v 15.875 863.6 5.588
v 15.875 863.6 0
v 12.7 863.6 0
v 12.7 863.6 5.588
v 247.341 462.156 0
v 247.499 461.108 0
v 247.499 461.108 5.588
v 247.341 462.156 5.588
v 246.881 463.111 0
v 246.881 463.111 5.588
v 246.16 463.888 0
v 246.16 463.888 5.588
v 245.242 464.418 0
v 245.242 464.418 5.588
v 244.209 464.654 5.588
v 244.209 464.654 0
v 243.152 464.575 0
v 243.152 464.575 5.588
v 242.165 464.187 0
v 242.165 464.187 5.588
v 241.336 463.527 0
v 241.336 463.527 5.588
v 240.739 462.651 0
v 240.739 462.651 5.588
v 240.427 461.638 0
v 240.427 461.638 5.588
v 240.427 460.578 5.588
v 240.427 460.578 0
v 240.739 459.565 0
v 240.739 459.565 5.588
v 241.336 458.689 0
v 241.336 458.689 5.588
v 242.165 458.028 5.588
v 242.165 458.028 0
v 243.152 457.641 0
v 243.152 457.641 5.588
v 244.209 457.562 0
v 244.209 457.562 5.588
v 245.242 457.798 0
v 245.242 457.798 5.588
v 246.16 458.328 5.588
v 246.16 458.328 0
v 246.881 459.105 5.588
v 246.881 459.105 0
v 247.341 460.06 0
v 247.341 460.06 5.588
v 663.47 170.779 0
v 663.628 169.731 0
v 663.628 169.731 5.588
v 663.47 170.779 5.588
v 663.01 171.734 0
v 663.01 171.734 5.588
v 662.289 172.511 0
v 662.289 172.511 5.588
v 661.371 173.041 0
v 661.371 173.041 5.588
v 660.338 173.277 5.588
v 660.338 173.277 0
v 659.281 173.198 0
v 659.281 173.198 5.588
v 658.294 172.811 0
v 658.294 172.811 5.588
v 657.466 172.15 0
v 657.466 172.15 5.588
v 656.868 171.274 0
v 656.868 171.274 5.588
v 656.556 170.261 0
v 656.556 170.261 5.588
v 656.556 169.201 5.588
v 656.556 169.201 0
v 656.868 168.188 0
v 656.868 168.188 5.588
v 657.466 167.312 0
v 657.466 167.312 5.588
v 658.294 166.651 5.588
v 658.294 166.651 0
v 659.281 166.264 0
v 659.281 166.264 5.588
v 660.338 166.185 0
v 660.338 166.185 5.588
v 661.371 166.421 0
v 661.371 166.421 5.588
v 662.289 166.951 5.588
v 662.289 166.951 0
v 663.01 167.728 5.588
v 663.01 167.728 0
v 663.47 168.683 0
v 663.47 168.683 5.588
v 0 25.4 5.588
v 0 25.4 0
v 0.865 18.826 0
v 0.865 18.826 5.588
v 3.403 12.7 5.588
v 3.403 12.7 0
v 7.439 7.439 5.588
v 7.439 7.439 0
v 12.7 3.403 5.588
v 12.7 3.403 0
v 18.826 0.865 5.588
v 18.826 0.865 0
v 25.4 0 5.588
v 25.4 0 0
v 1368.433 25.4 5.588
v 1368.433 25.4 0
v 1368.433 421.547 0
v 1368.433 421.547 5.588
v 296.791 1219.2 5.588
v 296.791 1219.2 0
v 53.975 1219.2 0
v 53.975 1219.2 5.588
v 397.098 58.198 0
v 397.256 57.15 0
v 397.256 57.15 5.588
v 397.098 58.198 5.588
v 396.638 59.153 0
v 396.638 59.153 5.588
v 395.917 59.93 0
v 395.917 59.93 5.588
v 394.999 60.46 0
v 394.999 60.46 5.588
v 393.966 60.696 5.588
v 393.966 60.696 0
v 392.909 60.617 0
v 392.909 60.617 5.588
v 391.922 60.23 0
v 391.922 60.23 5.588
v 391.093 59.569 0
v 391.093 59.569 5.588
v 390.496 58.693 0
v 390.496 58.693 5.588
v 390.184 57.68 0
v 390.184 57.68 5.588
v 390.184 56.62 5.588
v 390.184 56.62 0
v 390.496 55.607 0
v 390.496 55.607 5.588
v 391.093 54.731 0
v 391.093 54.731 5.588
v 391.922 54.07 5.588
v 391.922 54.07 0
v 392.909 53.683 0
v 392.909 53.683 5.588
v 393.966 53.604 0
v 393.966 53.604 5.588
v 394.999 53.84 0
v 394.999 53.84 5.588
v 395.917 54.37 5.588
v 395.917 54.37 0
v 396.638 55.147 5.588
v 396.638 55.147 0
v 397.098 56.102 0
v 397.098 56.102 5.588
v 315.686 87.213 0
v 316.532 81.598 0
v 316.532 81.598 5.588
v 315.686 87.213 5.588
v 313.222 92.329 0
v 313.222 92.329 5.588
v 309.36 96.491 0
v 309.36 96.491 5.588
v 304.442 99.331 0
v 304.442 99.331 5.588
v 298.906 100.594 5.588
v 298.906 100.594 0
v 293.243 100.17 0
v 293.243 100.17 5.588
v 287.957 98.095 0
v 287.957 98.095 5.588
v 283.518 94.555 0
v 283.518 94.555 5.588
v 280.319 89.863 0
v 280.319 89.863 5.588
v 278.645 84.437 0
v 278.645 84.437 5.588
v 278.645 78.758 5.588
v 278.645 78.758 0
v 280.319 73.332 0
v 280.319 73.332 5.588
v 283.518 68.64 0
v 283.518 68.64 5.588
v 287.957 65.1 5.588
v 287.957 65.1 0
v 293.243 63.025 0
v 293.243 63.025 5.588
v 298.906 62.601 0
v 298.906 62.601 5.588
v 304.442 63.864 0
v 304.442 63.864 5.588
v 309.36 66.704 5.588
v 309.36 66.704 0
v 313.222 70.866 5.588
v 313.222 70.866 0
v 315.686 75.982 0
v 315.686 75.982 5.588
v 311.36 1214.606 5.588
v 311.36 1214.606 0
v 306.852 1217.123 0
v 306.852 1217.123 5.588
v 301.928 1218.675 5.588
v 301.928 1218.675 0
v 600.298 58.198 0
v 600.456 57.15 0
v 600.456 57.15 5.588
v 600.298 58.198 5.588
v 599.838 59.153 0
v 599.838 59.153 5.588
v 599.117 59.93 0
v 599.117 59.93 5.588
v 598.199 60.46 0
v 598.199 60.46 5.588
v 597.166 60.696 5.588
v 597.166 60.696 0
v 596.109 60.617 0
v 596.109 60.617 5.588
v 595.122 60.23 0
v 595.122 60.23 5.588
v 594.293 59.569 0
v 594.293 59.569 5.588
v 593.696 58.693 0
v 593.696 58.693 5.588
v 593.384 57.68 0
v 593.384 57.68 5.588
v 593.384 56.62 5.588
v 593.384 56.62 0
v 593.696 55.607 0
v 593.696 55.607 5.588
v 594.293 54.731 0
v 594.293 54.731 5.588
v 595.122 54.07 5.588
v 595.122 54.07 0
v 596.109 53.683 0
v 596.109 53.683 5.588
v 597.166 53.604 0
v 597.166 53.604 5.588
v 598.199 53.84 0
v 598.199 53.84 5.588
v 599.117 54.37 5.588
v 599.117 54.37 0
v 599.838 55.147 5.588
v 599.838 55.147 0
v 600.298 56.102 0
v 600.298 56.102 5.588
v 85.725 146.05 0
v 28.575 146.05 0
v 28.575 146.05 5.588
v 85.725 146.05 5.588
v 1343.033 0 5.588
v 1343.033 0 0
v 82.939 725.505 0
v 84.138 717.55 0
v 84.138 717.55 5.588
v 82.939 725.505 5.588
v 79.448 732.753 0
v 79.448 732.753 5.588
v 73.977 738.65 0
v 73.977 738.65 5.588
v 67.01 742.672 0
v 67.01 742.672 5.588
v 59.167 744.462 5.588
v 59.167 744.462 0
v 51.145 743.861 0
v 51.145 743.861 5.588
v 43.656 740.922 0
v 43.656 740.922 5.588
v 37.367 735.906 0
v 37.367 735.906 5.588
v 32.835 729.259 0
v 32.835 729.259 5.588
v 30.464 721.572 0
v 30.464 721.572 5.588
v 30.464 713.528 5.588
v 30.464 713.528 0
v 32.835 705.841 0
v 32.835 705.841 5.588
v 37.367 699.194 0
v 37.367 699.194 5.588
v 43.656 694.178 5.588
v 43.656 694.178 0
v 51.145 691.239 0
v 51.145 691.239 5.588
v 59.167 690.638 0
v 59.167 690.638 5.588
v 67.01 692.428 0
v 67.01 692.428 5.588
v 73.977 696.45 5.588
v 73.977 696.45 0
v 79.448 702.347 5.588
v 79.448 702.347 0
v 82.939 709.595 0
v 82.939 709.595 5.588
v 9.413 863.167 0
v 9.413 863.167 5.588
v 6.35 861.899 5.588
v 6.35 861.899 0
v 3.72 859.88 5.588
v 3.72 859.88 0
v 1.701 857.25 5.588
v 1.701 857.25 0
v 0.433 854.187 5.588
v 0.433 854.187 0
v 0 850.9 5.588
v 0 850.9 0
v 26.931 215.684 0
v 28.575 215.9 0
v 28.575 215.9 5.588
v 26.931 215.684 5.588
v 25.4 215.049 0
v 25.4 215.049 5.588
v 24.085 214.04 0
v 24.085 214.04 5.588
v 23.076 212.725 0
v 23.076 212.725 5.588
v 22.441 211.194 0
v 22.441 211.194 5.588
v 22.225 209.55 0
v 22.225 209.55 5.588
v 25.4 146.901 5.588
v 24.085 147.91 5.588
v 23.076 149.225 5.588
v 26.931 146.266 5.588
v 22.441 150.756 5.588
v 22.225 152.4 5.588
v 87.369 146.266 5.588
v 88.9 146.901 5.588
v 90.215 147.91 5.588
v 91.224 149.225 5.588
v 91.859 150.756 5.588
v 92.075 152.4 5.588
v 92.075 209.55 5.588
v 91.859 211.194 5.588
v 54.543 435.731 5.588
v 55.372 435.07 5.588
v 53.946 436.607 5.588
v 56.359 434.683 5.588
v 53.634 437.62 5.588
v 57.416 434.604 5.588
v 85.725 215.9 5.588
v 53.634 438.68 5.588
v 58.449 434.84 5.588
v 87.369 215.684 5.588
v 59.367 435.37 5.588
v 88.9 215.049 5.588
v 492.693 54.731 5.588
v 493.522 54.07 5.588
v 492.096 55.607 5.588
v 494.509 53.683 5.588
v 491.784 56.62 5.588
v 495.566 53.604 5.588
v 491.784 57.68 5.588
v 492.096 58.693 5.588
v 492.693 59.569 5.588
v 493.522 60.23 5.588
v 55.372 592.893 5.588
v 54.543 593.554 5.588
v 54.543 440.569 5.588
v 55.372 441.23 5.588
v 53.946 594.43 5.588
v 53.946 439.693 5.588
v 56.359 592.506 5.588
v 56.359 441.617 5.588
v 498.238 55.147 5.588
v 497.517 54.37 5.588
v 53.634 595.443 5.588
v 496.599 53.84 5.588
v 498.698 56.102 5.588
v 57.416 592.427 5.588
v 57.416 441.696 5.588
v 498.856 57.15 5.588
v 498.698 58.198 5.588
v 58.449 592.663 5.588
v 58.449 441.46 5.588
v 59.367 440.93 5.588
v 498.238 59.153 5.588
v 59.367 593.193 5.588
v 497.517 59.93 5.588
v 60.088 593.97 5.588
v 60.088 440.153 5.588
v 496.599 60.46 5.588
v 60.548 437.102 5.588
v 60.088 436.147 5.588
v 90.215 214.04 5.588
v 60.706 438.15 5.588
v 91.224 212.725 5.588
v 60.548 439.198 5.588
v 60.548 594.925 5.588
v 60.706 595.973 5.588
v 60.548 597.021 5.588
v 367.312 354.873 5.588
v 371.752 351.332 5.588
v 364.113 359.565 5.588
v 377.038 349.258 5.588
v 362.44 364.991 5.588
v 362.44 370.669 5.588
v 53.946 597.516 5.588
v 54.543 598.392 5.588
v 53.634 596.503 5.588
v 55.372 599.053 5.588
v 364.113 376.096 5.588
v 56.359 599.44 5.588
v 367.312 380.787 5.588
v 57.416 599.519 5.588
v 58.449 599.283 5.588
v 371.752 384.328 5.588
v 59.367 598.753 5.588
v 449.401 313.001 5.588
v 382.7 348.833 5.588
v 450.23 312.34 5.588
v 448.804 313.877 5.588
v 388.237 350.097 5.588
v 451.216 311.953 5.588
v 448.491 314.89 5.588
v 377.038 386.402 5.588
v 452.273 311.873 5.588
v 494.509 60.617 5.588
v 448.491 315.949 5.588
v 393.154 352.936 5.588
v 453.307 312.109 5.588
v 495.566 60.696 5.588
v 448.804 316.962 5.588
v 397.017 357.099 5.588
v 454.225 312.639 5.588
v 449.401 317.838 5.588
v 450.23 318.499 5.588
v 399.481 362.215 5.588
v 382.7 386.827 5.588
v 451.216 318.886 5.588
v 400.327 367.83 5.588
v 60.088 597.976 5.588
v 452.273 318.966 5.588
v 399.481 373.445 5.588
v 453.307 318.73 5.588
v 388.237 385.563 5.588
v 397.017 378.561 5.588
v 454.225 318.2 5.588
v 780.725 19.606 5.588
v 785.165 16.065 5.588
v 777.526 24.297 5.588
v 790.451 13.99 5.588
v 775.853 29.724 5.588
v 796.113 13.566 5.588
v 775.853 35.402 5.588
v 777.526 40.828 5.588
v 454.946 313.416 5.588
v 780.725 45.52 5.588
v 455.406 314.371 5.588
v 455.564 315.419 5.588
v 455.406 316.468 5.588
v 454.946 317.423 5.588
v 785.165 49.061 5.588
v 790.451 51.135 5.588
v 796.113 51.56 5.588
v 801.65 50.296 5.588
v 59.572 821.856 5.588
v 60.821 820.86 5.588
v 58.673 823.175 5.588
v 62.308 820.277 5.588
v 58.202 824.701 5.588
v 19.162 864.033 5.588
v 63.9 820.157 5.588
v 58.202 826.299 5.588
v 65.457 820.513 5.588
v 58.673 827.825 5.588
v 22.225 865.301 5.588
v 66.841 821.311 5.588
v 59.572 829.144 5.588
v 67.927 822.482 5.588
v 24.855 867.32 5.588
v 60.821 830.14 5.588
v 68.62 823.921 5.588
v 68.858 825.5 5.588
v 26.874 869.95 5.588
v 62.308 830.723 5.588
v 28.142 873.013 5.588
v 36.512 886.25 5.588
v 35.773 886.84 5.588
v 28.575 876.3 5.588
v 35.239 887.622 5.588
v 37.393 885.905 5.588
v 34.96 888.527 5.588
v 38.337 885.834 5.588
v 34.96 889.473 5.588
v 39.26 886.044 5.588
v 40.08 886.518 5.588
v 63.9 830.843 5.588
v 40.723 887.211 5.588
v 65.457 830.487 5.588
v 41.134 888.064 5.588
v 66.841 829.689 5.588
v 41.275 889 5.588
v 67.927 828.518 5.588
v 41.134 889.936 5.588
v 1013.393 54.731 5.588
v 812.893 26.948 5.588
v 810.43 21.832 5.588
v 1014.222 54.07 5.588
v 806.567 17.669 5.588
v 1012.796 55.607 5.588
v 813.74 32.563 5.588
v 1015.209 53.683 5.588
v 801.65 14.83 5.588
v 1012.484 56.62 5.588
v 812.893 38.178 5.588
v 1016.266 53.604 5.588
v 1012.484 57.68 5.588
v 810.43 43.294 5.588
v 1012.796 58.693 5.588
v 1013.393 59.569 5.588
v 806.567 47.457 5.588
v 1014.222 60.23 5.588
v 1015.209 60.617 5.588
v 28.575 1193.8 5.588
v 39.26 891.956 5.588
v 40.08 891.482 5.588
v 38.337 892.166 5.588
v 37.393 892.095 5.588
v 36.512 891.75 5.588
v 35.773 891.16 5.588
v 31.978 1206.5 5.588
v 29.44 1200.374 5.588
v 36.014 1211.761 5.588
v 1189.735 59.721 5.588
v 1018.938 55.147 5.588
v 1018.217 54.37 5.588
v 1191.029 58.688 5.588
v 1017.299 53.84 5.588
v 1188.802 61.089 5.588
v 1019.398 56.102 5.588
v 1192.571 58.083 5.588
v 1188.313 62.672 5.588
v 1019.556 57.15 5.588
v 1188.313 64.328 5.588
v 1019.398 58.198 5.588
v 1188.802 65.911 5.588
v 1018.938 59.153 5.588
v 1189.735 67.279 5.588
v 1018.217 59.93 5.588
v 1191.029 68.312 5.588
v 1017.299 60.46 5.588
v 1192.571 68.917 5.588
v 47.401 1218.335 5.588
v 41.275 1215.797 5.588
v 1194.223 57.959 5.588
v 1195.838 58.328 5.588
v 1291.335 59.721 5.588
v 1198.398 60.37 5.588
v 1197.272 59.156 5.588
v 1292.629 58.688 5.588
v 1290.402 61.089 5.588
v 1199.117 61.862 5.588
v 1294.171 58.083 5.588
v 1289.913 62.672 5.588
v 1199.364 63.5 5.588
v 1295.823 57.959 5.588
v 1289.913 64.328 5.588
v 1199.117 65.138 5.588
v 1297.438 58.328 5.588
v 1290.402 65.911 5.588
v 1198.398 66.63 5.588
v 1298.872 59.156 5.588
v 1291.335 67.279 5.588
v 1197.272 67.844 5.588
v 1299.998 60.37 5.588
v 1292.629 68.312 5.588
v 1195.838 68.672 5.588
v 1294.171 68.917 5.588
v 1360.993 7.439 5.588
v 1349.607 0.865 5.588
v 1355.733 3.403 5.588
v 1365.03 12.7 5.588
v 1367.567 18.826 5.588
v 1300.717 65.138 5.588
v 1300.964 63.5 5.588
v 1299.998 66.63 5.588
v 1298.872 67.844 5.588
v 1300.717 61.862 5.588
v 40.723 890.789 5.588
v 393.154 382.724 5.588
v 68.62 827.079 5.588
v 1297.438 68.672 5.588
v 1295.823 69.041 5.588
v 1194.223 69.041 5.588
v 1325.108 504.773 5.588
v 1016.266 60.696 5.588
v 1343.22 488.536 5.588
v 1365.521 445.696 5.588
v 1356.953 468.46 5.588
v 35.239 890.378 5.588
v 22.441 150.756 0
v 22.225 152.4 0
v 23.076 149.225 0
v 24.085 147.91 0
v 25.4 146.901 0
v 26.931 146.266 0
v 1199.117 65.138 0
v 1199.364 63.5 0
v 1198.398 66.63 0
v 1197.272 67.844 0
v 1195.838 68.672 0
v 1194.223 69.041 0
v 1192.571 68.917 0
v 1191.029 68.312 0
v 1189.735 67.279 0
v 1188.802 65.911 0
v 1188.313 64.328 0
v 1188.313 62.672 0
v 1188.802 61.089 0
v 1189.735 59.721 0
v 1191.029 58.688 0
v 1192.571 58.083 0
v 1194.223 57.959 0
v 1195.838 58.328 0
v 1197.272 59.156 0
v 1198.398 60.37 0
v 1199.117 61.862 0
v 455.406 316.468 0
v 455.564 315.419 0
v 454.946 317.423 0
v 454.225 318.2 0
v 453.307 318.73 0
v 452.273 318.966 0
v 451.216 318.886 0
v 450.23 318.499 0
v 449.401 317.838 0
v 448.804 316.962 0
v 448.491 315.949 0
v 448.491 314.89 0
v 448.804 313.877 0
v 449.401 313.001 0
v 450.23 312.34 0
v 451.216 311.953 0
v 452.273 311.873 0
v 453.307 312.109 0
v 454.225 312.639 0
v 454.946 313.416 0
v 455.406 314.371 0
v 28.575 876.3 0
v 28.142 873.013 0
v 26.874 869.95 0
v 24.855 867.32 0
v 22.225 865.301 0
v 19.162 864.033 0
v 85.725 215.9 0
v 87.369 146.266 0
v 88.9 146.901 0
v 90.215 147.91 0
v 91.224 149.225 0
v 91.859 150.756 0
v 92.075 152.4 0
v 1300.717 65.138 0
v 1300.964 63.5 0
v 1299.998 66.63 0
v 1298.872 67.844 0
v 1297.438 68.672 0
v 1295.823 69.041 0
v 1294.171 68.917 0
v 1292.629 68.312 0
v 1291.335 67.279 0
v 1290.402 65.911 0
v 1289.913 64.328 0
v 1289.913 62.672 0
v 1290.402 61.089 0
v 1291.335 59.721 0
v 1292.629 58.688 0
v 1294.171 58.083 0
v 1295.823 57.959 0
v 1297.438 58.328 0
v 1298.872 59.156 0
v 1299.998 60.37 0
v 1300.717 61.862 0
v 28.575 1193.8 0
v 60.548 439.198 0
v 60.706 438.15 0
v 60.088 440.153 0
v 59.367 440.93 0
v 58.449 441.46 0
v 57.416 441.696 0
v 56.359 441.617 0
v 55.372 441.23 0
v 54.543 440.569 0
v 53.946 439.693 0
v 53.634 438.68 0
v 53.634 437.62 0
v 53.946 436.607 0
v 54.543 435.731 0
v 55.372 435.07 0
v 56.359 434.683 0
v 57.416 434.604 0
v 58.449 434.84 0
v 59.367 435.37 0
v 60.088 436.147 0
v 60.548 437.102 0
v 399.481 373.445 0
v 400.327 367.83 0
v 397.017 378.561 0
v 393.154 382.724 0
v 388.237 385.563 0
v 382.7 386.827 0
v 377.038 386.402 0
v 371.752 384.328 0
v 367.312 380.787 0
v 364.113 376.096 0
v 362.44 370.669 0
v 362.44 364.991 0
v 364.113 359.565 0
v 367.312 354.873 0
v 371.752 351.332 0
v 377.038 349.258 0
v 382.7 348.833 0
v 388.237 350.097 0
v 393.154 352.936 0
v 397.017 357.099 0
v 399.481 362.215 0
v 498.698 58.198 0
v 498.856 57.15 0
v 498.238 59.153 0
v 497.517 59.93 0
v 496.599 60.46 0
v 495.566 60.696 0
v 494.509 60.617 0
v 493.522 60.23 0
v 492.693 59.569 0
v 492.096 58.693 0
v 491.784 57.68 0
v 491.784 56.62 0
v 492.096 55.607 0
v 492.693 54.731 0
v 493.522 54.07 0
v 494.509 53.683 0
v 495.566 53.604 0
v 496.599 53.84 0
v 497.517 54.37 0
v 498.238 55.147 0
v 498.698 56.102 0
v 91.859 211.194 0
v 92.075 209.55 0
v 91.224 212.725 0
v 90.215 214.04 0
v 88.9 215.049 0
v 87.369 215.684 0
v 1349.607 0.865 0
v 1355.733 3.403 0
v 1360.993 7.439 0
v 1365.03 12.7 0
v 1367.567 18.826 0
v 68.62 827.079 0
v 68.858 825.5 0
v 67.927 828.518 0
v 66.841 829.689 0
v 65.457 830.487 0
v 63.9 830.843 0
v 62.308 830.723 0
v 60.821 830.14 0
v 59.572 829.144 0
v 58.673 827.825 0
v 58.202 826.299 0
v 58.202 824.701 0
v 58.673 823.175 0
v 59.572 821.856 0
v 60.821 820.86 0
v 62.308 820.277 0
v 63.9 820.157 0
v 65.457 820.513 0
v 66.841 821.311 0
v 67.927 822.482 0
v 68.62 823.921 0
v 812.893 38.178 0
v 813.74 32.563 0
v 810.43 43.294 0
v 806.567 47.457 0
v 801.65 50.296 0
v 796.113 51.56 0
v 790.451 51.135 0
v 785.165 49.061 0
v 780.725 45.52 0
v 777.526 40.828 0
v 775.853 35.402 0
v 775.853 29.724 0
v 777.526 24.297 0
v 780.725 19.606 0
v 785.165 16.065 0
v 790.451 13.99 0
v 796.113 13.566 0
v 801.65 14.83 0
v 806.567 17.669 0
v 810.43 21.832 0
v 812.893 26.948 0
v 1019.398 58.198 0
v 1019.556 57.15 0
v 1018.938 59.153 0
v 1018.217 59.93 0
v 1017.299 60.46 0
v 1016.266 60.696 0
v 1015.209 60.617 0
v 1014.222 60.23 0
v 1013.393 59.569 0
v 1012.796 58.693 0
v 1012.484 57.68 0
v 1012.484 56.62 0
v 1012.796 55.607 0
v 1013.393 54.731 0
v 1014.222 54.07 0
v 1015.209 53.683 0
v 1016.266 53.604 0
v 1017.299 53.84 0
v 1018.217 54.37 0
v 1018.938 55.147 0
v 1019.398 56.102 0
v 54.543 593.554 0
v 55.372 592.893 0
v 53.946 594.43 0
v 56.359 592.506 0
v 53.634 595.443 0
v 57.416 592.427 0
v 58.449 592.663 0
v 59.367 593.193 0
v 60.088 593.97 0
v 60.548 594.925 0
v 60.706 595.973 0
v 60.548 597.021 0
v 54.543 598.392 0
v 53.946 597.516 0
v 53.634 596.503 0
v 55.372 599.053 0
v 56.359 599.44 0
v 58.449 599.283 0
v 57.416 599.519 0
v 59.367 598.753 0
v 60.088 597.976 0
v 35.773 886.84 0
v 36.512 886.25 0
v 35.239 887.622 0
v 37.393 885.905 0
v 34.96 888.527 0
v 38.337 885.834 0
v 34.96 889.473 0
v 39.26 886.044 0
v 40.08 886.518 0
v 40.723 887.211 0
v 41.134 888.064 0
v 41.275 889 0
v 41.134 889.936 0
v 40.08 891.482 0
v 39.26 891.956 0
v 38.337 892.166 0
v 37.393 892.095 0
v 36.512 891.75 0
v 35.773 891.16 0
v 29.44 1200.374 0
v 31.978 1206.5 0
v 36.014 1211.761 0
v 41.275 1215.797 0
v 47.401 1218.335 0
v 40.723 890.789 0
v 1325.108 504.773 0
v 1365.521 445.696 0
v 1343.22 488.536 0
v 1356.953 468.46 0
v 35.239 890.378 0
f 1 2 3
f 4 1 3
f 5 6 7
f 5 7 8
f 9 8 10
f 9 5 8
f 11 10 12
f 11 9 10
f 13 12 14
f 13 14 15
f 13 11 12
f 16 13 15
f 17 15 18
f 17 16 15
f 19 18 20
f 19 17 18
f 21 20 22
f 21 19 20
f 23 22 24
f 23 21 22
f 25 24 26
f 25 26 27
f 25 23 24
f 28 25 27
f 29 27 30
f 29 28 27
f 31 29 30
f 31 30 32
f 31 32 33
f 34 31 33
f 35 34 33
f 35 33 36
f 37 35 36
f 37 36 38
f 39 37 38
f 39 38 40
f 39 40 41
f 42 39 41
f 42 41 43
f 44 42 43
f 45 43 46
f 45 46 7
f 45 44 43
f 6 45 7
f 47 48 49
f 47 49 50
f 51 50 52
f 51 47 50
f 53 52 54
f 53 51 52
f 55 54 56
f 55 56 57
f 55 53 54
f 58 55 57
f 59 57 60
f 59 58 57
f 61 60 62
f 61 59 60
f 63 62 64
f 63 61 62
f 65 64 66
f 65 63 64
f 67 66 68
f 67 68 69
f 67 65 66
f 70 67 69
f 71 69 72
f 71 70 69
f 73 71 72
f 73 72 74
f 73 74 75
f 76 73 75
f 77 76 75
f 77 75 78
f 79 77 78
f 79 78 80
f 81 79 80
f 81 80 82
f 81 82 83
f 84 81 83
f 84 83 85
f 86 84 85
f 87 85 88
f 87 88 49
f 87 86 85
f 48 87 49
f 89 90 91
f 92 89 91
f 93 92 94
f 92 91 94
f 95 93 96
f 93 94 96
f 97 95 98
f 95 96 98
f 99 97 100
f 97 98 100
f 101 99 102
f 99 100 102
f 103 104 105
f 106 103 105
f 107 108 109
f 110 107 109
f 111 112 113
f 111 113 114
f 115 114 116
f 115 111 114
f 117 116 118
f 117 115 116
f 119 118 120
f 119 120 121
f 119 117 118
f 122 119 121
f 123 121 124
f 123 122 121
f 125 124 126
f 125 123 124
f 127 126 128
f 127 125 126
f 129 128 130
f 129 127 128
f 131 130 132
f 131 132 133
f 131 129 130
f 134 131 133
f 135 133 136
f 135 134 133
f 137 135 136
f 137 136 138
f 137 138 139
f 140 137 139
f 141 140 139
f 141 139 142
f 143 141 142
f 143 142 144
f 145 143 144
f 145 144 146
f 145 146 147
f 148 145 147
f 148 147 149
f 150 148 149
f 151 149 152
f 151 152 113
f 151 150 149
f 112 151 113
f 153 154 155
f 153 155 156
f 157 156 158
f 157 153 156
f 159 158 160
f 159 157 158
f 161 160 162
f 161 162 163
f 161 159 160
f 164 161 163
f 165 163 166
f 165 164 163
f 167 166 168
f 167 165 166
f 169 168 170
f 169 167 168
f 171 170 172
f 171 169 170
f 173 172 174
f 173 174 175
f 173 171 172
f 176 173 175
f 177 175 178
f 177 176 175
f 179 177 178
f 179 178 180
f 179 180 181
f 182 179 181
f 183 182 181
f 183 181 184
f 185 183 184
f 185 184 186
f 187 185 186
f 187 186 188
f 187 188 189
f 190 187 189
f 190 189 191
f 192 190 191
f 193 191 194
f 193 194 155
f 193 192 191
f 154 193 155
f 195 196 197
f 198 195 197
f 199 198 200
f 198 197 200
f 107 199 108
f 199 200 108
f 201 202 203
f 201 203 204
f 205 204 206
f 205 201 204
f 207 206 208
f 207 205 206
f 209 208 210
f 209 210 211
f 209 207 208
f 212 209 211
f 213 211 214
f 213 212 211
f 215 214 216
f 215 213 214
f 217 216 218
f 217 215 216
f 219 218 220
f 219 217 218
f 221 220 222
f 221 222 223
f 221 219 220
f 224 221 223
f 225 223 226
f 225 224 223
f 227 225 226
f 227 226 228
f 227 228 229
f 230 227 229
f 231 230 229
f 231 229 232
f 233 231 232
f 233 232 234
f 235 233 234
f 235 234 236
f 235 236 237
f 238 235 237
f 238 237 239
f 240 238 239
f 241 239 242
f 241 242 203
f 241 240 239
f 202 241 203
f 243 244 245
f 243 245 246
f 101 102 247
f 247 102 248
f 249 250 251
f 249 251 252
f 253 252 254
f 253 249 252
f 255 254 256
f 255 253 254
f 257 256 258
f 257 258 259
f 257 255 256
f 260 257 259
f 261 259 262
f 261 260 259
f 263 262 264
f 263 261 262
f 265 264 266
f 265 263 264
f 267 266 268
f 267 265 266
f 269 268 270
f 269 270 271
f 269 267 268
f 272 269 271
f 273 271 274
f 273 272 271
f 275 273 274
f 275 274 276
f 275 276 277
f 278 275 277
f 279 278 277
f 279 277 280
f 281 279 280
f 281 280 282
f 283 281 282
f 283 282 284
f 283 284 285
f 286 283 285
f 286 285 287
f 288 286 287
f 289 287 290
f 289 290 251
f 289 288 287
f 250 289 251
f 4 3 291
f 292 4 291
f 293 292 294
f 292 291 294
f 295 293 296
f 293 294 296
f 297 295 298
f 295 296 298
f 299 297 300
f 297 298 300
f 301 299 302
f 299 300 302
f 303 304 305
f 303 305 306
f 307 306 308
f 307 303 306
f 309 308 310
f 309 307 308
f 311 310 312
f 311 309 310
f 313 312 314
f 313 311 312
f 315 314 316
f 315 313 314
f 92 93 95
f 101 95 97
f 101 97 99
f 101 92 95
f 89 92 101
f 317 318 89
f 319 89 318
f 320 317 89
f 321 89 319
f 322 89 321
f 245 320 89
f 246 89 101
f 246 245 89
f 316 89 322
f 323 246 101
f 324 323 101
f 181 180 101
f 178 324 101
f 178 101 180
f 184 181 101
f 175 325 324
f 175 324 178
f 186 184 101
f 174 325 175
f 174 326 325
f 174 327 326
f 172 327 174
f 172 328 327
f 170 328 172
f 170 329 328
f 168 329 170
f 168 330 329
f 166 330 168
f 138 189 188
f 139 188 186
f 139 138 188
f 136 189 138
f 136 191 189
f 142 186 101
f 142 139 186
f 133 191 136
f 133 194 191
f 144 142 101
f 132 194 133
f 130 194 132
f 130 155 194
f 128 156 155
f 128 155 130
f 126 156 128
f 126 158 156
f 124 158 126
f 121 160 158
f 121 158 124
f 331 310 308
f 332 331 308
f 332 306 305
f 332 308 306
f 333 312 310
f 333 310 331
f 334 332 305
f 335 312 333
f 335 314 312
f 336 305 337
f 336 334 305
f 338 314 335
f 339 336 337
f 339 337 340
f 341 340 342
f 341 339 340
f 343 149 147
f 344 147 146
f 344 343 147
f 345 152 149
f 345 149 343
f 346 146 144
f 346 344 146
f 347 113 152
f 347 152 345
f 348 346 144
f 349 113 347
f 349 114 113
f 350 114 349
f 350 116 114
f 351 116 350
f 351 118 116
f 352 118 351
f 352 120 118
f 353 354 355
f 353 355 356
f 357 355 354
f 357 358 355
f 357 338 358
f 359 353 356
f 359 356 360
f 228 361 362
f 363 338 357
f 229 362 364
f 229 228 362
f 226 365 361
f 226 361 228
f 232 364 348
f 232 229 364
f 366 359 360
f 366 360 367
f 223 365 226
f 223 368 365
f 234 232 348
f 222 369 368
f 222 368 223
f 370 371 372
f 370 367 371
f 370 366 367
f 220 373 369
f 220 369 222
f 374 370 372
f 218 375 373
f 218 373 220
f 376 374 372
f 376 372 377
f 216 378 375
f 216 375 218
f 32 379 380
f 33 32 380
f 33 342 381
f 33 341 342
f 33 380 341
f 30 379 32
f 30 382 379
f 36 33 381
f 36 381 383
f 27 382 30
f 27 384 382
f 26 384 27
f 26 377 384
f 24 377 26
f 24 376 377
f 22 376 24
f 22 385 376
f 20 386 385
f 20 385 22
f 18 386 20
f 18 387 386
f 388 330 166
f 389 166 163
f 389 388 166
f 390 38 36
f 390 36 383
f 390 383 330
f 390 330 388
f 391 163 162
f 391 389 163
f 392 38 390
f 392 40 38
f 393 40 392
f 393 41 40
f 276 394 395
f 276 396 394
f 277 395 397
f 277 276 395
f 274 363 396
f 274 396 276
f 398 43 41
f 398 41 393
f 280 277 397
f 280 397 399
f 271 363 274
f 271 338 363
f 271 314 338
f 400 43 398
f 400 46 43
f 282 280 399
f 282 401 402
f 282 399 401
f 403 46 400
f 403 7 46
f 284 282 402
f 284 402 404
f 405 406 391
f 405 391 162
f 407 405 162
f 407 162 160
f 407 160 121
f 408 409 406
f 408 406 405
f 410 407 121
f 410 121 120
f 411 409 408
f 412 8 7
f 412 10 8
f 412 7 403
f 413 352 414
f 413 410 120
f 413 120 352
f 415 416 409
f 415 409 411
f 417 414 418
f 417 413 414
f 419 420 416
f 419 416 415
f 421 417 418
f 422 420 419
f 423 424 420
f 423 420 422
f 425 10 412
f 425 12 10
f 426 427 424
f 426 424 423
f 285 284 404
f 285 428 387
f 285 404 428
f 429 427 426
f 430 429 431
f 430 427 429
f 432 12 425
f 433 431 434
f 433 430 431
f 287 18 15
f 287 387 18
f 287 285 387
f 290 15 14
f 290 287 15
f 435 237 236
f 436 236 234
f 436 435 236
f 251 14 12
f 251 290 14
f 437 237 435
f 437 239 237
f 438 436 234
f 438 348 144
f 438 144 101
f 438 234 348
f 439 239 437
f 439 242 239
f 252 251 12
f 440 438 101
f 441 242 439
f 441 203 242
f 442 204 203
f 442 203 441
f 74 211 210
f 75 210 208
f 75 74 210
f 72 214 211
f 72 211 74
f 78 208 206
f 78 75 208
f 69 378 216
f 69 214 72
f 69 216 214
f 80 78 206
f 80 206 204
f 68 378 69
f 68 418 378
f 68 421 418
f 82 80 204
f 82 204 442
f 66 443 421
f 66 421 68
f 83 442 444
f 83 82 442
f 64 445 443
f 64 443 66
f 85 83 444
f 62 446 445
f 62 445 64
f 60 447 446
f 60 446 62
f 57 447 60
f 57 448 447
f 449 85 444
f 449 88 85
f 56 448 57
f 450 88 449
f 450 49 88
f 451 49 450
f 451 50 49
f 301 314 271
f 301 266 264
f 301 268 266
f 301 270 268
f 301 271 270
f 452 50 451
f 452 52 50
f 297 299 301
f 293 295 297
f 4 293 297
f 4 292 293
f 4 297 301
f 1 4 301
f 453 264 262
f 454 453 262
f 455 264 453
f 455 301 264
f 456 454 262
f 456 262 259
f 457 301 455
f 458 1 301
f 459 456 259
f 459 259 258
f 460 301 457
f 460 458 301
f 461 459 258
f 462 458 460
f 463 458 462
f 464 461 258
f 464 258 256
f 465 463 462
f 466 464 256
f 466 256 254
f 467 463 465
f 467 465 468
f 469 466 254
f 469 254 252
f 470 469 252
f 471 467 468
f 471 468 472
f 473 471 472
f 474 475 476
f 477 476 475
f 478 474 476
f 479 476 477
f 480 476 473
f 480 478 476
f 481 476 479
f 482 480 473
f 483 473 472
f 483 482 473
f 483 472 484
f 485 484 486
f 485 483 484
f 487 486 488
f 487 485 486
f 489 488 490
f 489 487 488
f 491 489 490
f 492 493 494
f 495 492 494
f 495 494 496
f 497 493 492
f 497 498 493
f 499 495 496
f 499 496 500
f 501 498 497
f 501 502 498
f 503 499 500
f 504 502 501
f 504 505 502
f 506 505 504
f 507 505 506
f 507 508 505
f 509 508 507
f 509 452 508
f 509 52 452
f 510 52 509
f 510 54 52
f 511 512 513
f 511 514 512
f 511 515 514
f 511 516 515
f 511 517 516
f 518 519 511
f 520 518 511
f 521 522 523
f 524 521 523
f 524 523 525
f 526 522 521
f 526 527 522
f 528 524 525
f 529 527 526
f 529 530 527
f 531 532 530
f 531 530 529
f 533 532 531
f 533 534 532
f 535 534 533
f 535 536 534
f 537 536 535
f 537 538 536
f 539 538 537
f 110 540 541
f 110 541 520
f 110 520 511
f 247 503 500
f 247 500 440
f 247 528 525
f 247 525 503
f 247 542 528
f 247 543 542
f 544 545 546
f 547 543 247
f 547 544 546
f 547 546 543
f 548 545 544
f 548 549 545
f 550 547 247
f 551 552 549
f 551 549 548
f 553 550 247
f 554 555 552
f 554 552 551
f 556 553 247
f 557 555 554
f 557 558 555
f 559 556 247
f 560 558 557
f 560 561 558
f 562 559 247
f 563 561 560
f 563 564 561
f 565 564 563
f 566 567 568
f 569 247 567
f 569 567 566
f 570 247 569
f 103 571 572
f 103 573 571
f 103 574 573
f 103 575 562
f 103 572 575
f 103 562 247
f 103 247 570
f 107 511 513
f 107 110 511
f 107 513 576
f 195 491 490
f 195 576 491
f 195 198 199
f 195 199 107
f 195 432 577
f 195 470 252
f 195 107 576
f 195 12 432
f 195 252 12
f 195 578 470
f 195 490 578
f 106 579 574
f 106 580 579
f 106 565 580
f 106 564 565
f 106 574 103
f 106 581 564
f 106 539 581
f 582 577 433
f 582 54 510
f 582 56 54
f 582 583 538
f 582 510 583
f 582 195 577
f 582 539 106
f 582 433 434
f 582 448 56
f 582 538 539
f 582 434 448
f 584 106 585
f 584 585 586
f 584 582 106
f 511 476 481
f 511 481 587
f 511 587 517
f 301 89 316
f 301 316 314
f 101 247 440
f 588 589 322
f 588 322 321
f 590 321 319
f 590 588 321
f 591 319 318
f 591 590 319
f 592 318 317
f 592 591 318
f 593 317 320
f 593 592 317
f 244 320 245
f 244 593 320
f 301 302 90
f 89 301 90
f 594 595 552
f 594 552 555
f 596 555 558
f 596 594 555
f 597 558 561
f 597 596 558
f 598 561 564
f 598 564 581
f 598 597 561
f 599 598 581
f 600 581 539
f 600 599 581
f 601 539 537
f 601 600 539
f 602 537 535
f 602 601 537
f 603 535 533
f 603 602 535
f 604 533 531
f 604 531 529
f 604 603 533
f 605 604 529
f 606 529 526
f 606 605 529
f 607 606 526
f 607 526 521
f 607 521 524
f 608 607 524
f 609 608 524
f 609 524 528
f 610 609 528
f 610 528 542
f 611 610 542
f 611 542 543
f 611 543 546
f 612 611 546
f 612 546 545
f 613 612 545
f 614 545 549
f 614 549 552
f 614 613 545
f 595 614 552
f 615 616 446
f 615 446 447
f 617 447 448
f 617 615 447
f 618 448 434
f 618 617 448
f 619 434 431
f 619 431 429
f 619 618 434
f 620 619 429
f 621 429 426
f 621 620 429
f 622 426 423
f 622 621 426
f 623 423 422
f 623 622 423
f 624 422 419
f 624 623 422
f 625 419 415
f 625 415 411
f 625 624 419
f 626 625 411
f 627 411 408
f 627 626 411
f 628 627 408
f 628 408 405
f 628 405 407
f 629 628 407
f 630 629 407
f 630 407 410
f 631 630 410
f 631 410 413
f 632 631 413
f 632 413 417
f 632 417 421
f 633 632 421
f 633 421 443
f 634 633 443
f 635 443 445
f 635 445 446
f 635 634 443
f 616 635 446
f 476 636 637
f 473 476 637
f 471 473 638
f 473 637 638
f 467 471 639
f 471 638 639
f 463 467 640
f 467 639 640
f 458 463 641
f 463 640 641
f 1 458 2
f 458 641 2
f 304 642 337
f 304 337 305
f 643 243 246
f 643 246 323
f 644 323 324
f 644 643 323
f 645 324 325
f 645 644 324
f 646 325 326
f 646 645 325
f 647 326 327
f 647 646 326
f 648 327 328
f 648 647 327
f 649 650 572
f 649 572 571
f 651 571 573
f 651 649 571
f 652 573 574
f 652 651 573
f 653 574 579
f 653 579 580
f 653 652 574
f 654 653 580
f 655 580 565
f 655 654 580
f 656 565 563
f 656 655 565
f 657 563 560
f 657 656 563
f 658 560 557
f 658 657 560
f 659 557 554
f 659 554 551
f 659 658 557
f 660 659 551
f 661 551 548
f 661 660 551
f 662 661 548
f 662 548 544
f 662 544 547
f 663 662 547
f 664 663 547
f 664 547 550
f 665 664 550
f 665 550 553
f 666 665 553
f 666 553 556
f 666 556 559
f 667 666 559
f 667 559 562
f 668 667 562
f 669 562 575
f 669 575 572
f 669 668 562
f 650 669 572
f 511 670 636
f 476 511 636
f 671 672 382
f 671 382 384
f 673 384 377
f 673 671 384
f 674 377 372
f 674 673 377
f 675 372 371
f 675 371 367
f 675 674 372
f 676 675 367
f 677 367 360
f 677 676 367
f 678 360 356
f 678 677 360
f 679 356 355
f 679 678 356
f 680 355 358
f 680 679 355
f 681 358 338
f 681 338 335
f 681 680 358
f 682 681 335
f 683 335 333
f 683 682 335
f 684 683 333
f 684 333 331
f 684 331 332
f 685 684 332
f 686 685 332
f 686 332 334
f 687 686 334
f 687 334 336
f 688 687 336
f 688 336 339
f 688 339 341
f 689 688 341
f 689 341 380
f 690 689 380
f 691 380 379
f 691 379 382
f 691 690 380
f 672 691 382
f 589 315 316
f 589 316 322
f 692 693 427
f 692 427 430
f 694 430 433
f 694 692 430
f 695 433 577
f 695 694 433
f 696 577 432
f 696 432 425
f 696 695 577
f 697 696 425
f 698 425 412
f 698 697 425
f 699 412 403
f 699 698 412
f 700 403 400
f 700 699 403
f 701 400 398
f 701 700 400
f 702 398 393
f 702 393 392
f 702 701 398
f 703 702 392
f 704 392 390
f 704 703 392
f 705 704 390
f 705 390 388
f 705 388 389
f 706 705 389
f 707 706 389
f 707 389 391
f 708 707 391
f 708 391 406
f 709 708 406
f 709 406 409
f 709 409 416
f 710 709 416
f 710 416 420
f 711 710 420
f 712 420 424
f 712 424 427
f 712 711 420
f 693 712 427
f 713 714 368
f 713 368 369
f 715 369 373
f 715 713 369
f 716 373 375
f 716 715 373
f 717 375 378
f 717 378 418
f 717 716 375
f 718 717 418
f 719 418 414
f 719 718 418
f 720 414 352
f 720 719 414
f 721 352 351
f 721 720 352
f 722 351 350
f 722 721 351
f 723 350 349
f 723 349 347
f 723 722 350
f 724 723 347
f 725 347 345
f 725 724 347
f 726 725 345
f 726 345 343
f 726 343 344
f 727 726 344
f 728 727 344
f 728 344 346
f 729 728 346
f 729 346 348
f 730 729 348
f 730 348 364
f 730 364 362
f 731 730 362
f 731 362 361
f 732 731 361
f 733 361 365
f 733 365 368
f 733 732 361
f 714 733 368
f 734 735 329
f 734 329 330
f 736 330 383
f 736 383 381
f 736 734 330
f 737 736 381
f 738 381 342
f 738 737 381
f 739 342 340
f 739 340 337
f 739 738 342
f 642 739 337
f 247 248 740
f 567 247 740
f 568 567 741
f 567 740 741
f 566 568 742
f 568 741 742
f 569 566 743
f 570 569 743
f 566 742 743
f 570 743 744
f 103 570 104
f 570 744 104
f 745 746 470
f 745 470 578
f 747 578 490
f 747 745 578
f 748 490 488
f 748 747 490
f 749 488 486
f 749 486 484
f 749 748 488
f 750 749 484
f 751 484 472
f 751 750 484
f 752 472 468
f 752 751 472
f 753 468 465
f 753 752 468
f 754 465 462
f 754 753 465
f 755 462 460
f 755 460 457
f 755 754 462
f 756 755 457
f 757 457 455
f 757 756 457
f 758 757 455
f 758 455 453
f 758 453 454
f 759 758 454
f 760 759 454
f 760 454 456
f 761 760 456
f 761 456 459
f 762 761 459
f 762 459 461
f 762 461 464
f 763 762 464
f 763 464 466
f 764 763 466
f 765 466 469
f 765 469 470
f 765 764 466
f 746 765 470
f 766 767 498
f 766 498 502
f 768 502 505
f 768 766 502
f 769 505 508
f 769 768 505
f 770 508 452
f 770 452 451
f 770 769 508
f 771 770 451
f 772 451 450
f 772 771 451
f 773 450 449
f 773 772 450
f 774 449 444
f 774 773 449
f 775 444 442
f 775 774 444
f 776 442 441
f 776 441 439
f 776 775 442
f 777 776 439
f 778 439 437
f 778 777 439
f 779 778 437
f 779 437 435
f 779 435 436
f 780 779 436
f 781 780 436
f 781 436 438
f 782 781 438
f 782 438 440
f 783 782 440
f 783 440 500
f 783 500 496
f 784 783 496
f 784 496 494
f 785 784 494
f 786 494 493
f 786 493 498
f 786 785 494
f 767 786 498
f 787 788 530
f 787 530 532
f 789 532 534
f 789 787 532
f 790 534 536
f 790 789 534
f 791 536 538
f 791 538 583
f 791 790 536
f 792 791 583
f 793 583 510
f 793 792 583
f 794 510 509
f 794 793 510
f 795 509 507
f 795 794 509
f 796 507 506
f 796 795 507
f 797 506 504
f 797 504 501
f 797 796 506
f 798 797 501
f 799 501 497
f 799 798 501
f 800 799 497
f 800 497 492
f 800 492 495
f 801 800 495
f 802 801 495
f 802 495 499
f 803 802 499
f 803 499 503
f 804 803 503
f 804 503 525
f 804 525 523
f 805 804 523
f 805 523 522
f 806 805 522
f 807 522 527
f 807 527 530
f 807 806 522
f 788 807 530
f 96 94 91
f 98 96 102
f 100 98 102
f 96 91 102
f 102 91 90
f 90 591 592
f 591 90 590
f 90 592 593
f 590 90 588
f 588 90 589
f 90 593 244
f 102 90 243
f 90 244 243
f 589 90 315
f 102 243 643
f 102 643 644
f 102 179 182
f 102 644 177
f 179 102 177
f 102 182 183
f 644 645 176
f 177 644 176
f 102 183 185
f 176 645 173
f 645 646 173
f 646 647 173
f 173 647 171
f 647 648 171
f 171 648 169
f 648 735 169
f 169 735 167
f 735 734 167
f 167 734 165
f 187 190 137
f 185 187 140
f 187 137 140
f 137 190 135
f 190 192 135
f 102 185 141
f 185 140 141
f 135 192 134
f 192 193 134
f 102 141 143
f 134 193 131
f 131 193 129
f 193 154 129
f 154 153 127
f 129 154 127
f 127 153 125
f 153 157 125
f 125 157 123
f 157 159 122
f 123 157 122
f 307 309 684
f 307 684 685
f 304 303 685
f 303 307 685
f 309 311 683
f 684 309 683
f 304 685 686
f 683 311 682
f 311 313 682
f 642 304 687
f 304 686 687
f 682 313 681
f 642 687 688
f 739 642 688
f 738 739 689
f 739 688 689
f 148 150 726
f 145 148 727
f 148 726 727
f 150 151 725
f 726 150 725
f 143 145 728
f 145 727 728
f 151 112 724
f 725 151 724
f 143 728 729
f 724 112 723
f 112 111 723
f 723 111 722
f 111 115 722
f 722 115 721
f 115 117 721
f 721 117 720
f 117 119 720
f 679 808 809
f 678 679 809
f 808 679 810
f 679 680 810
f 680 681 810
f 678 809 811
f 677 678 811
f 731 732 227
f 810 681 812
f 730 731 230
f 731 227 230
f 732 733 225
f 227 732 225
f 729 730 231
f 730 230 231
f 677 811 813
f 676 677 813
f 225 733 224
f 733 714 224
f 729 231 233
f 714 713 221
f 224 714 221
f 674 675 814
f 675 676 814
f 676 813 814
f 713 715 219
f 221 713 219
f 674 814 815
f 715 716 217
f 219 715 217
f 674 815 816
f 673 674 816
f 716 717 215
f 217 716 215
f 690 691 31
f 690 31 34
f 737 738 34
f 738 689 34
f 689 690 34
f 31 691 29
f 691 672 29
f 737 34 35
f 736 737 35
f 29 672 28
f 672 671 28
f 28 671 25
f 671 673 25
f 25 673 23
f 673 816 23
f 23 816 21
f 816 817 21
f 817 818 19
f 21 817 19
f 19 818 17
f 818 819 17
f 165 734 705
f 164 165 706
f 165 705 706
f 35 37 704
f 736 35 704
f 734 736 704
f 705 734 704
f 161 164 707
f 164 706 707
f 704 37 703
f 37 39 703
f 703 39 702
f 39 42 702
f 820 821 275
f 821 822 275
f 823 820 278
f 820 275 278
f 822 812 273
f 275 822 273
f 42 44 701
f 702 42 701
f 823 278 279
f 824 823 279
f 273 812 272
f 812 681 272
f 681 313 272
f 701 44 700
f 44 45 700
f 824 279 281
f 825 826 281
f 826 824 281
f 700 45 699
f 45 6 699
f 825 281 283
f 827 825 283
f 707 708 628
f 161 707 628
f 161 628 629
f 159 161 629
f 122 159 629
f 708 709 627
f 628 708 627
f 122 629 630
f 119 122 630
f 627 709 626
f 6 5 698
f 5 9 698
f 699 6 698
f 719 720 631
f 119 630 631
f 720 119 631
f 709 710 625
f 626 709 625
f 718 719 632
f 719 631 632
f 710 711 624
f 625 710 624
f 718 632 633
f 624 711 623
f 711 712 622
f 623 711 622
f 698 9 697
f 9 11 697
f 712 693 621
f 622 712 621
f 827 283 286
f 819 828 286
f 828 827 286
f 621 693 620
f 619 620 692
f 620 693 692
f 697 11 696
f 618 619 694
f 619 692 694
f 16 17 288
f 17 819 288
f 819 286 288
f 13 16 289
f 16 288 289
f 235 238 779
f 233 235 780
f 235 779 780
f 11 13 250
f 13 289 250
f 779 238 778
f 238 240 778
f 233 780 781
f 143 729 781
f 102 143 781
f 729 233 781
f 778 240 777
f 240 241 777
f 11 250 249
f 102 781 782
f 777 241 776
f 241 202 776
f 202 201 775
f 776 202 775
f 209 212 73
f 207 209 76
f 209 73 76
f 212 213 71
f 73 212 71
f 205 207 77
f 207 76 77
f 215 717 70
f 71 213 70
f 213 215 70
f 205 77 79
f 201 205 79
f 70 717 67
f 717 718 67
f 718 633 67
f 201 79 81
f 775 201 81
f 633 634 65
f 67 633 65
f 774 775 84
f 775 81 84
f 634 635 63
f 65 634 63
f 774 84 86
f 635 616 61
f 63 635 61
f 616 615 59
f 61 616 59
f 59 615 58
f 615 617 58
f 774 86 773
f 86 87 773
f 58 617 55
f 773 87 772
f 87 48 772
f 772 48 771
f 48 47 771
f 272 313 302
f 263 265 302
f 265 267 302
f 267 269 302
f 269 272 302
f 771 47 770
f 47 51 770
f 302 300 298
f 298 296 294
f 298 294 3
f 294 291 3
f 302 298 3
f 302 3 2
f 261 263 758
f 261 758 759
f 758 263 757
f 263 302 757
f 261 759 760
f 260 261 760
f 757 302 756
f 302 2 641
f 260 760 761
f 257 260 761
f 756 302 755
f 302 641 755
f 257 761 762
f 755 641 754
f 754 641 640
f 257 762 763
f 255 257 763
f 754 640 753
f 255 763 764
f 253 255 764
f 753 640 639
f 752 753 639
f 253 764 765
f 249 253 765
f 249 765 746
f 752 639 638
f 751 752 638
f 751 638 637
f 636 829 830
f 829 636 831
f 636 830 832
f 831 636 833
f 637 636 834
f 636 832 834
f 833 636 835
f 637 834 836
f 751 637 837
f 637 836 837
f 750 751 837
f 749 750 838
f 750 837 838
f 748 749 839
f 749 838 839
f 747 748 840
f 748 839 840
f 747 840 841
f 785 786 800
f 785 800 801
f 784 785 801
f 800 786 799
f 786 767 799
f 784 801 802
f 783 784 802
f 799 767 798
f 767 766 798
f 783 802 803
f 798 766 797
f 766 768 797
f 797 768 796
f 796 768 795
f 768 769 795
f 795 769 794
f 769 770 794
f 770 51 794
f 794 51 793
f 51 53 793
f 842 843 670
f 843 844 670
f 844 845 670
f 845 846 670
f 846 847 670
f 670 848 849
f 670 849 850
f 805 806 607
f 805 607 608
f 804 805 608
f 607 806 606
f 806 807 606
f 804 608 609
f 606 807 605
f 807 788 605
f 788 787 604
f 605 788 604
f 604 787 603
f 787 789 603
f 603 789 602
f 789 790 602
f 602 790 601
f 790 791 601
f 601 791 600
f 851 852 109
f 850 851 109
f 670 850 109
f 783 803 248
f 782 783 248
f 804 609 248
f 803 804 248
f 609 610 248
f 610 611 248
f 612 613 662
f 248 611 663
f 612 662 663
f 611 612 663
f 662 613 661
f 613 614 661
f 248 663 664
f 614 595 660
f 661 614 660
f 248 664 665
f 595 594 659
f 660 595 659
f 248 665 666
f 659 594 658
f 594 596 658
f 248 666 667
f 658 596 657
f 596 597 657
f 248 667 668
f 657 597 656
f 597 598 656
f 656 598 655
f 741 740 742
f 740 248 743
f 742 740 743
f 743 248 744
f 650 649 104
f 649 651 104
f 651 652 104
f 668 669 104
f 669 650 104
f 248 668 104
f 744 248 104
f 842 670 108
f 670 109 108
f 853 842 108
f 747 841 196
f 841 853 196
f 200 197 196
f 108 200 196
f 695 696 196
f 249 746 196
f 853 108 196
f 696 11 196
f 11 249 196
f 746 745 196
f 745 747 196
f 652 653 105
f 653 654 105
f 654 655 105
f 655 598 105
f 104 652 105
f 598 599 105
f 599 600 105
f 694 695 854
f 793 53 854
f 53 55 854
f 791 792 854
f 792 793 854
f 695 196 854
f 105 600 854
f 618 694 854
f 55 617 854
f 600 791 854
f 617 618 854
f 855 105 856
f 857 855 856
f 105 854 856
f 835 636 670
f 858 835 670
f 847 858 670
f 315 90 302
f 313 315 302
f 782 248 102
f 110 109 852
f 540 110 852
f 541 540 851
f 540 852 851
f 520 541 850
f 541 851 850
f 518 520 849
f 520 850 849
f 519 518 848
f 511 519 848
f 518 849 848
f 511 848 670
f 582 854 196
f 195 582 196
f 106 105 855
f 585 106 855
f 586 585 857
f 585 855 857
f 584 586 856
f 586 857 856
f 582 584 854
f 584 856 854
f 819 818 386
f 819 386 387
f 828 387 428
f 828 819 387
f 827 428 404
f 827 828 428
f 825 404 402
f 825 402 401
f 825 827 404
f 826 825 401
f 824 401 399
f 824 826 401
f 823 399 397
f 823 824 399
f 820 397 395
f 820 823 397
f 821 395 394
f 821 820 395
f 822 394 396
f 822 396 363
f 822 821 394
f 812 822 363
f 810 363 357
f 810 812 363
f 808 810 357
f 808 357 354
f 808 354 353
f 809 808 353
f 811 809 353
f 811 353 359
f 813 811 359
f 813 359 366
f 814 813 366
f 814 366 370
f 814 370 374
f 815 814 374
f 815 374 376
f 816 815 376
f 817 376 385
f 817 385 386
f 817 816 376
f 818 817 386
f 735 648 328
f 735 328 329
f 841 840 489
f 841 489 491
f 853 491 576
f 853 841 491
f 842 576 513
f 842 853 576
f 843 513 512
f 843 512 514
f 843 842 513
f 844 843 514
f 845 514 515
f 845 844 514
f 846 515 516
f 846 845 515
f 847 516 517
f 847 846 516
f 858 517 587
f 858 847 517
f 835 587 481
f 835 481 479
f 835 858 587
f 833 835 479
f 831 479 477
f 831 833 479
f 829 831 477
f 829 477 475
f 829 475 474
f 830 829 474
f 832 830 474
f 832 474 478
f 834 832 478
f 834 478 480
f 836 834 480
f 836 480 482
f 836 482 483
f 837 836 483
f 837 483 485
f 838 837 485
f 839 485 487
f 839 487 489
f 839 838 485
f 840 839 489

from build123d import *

# Parameters (mm, degrees)
SKETCH1_R           = 19.05
SKETCH1_R_2         = 26.987499999
SKETCH1_R_3         = 3.556
SKETCH1_R_4         = 5.55625
SKETCH1_R_5         = 3.175
SKETCH1_R_6         = 5.3578125
BOSS_EXTRUDE1_DEPTH = 5.588


with BuildPart() as part:
    # Sketch1 → Boss-Extrude1 (new body)
    with BuildSketch(Plane.XY):
        with BuildLine():
            Line((1368.43262, 25.4), (1368.43262, 421.546809256))
            ThreePointArc((1368.43262, 421.546809256), (1356.952920651, 468.460468361), (1325.107985933, 504.772656956))
            Line((1325.107985933, 504.772656956), (311.360252246, 1214.606461927))
            ThreePointArc((311.360252246, 1214.606461927), (304.42933807, 1218.024410551), (296.791410762, 1219.200000002))
            Line((296.791410762, 1219.200000002), (53.975, 1219.200000002))
            ThreePointArc((53.975, 1219.200000002), (36.014487758, 1211.760512244), (28.575, 1193.800000002))
            Line((28.575, 1193.800000002), (28.575, 876.300000002))
            ThreePointArc((28.575, 876.300000002), (24.855256121, 867.319743881), (15.875, 863.600000002))
            Line((15.875, 863.600000002), (12.7, 863.600000002))
            ThreePointArc((12.7, 863.600000002), (3.719743879, 859.880256123), (0, 850.900000002))
            Line((0, 850.900000002), (0, 25.4))
            ThreePointArc((0, 25.4), (7.439487758, 7.439487758), (25.4, 0))
            Line((25.4, 0), (1343.03262, 0))
            ThreePointArc((1343.03262, 0), (1360.993132242, 7.439487758), (1368.43262, 25.4))
        make_face()
        with Locations((794.6898, 32.562800001)):
            Circle(SKETCH1_R, mode=Mode.SUBTRACT)
        with Locations((381.27686, 367.8301)):
            Circle(SKETCH1_R, mode=Mode.SUBTRACT)
        with Locations((57.150106704, 717.550000002)):
            Circle(SKETCH1_R_2, mode=Mode.SUBTRACT)
        with Locations((297.48226, 81.5975)):
            Circle(SKETCH1_R, mode=Mode.SUBTRACT)
        with Locations((57.150106704, 595.973055669)):
            Circle(SKETCH1_R_3, mode=Mode.SUBTRACT)
        with Locations((57.150106704, 438.150000002)):
            Circle(SKETCH1_R_3, mode=Mode.SUBTRACT)
        with Locations((243.943004281, 461.107910727)):
            Circle(SKETCH1_R_3, mode=Mode.SUBTRACT)
        with Locations((452.007623531, 315.419495894)):
            Circle(SKETCH1_R_3, mode=Mode.SUBTRACT)
        with Locations((660.07224278, 169.731081062)):
            Circle(SKETCH1_R_3, mode=Mode.SUBTRACT)
        with Locations((393.7, 57.150000001)):
            Circle(SKETCH1_R_3, mode=Mode.SUBTRACT)
        with Locations((495.3, 57.150000001)):
            Circle(SKETCH1_R_3, mode=Mode.SUBTRACT)
        with Locations((596.9, 57.150000001)):
            Circle(SKETCH1_R_3, mode=Mode.SUBTRACT)
        with Locations((1016, 57.150000001)):
            Circle(SKETCH1_R_3, mode=Mode.SUBTRACT)
        with Locations((1193.80762, 63.5)):
            Circle(SKETCH1_R_4, mode=Mode.SUBTRACT)
        with Locations((1295.40762, 63.5)):
            Circle(SKETCH1_R_4, mode=Mode.SUBTRACT)
        with Locations((38.1, 889.000000002)):
            Circle(SKETCH1_R_5, mode=Mode.SUBTRACT)
        with Locations((63.5, 825.500000002)):
            Circle(SKETCH1_R_6, mode=Mode.SUBTRACT)
        with BuildLine():
            Line((22.225, 209.550000002), (22.225, 152.400000002))
            ThreePointArc((22.225, 152.400000002), (24.084871939, 147.909871941), (28.575, 146.050000002))
            Line((28.575, 146.050000002), (85.725, 146.050000002))
            ThreePointArc((85.725, 146.050000002), (90.215128061, 147.909871941), (92.075, 152.400000002))
            Line((92.075, 152.400000002), (92.075, 209.550000002))
            ThreePointArc((92.075, 209.550000002), (90.215128061, 214.040128062), (85.725, 215.900000002))
            Line((85.725, 215.900000002), (28.575, 215.900000002))
            ThreePointArc((28.575, 215.900000002), (24.084871939, 214.040128062), (22.225, 209.550000002))
        make_face(mode=Mode.SUBTRACT)
    extrude(amount=BOSS_EXTRUDE1_DEPTH)


solid = part.part
